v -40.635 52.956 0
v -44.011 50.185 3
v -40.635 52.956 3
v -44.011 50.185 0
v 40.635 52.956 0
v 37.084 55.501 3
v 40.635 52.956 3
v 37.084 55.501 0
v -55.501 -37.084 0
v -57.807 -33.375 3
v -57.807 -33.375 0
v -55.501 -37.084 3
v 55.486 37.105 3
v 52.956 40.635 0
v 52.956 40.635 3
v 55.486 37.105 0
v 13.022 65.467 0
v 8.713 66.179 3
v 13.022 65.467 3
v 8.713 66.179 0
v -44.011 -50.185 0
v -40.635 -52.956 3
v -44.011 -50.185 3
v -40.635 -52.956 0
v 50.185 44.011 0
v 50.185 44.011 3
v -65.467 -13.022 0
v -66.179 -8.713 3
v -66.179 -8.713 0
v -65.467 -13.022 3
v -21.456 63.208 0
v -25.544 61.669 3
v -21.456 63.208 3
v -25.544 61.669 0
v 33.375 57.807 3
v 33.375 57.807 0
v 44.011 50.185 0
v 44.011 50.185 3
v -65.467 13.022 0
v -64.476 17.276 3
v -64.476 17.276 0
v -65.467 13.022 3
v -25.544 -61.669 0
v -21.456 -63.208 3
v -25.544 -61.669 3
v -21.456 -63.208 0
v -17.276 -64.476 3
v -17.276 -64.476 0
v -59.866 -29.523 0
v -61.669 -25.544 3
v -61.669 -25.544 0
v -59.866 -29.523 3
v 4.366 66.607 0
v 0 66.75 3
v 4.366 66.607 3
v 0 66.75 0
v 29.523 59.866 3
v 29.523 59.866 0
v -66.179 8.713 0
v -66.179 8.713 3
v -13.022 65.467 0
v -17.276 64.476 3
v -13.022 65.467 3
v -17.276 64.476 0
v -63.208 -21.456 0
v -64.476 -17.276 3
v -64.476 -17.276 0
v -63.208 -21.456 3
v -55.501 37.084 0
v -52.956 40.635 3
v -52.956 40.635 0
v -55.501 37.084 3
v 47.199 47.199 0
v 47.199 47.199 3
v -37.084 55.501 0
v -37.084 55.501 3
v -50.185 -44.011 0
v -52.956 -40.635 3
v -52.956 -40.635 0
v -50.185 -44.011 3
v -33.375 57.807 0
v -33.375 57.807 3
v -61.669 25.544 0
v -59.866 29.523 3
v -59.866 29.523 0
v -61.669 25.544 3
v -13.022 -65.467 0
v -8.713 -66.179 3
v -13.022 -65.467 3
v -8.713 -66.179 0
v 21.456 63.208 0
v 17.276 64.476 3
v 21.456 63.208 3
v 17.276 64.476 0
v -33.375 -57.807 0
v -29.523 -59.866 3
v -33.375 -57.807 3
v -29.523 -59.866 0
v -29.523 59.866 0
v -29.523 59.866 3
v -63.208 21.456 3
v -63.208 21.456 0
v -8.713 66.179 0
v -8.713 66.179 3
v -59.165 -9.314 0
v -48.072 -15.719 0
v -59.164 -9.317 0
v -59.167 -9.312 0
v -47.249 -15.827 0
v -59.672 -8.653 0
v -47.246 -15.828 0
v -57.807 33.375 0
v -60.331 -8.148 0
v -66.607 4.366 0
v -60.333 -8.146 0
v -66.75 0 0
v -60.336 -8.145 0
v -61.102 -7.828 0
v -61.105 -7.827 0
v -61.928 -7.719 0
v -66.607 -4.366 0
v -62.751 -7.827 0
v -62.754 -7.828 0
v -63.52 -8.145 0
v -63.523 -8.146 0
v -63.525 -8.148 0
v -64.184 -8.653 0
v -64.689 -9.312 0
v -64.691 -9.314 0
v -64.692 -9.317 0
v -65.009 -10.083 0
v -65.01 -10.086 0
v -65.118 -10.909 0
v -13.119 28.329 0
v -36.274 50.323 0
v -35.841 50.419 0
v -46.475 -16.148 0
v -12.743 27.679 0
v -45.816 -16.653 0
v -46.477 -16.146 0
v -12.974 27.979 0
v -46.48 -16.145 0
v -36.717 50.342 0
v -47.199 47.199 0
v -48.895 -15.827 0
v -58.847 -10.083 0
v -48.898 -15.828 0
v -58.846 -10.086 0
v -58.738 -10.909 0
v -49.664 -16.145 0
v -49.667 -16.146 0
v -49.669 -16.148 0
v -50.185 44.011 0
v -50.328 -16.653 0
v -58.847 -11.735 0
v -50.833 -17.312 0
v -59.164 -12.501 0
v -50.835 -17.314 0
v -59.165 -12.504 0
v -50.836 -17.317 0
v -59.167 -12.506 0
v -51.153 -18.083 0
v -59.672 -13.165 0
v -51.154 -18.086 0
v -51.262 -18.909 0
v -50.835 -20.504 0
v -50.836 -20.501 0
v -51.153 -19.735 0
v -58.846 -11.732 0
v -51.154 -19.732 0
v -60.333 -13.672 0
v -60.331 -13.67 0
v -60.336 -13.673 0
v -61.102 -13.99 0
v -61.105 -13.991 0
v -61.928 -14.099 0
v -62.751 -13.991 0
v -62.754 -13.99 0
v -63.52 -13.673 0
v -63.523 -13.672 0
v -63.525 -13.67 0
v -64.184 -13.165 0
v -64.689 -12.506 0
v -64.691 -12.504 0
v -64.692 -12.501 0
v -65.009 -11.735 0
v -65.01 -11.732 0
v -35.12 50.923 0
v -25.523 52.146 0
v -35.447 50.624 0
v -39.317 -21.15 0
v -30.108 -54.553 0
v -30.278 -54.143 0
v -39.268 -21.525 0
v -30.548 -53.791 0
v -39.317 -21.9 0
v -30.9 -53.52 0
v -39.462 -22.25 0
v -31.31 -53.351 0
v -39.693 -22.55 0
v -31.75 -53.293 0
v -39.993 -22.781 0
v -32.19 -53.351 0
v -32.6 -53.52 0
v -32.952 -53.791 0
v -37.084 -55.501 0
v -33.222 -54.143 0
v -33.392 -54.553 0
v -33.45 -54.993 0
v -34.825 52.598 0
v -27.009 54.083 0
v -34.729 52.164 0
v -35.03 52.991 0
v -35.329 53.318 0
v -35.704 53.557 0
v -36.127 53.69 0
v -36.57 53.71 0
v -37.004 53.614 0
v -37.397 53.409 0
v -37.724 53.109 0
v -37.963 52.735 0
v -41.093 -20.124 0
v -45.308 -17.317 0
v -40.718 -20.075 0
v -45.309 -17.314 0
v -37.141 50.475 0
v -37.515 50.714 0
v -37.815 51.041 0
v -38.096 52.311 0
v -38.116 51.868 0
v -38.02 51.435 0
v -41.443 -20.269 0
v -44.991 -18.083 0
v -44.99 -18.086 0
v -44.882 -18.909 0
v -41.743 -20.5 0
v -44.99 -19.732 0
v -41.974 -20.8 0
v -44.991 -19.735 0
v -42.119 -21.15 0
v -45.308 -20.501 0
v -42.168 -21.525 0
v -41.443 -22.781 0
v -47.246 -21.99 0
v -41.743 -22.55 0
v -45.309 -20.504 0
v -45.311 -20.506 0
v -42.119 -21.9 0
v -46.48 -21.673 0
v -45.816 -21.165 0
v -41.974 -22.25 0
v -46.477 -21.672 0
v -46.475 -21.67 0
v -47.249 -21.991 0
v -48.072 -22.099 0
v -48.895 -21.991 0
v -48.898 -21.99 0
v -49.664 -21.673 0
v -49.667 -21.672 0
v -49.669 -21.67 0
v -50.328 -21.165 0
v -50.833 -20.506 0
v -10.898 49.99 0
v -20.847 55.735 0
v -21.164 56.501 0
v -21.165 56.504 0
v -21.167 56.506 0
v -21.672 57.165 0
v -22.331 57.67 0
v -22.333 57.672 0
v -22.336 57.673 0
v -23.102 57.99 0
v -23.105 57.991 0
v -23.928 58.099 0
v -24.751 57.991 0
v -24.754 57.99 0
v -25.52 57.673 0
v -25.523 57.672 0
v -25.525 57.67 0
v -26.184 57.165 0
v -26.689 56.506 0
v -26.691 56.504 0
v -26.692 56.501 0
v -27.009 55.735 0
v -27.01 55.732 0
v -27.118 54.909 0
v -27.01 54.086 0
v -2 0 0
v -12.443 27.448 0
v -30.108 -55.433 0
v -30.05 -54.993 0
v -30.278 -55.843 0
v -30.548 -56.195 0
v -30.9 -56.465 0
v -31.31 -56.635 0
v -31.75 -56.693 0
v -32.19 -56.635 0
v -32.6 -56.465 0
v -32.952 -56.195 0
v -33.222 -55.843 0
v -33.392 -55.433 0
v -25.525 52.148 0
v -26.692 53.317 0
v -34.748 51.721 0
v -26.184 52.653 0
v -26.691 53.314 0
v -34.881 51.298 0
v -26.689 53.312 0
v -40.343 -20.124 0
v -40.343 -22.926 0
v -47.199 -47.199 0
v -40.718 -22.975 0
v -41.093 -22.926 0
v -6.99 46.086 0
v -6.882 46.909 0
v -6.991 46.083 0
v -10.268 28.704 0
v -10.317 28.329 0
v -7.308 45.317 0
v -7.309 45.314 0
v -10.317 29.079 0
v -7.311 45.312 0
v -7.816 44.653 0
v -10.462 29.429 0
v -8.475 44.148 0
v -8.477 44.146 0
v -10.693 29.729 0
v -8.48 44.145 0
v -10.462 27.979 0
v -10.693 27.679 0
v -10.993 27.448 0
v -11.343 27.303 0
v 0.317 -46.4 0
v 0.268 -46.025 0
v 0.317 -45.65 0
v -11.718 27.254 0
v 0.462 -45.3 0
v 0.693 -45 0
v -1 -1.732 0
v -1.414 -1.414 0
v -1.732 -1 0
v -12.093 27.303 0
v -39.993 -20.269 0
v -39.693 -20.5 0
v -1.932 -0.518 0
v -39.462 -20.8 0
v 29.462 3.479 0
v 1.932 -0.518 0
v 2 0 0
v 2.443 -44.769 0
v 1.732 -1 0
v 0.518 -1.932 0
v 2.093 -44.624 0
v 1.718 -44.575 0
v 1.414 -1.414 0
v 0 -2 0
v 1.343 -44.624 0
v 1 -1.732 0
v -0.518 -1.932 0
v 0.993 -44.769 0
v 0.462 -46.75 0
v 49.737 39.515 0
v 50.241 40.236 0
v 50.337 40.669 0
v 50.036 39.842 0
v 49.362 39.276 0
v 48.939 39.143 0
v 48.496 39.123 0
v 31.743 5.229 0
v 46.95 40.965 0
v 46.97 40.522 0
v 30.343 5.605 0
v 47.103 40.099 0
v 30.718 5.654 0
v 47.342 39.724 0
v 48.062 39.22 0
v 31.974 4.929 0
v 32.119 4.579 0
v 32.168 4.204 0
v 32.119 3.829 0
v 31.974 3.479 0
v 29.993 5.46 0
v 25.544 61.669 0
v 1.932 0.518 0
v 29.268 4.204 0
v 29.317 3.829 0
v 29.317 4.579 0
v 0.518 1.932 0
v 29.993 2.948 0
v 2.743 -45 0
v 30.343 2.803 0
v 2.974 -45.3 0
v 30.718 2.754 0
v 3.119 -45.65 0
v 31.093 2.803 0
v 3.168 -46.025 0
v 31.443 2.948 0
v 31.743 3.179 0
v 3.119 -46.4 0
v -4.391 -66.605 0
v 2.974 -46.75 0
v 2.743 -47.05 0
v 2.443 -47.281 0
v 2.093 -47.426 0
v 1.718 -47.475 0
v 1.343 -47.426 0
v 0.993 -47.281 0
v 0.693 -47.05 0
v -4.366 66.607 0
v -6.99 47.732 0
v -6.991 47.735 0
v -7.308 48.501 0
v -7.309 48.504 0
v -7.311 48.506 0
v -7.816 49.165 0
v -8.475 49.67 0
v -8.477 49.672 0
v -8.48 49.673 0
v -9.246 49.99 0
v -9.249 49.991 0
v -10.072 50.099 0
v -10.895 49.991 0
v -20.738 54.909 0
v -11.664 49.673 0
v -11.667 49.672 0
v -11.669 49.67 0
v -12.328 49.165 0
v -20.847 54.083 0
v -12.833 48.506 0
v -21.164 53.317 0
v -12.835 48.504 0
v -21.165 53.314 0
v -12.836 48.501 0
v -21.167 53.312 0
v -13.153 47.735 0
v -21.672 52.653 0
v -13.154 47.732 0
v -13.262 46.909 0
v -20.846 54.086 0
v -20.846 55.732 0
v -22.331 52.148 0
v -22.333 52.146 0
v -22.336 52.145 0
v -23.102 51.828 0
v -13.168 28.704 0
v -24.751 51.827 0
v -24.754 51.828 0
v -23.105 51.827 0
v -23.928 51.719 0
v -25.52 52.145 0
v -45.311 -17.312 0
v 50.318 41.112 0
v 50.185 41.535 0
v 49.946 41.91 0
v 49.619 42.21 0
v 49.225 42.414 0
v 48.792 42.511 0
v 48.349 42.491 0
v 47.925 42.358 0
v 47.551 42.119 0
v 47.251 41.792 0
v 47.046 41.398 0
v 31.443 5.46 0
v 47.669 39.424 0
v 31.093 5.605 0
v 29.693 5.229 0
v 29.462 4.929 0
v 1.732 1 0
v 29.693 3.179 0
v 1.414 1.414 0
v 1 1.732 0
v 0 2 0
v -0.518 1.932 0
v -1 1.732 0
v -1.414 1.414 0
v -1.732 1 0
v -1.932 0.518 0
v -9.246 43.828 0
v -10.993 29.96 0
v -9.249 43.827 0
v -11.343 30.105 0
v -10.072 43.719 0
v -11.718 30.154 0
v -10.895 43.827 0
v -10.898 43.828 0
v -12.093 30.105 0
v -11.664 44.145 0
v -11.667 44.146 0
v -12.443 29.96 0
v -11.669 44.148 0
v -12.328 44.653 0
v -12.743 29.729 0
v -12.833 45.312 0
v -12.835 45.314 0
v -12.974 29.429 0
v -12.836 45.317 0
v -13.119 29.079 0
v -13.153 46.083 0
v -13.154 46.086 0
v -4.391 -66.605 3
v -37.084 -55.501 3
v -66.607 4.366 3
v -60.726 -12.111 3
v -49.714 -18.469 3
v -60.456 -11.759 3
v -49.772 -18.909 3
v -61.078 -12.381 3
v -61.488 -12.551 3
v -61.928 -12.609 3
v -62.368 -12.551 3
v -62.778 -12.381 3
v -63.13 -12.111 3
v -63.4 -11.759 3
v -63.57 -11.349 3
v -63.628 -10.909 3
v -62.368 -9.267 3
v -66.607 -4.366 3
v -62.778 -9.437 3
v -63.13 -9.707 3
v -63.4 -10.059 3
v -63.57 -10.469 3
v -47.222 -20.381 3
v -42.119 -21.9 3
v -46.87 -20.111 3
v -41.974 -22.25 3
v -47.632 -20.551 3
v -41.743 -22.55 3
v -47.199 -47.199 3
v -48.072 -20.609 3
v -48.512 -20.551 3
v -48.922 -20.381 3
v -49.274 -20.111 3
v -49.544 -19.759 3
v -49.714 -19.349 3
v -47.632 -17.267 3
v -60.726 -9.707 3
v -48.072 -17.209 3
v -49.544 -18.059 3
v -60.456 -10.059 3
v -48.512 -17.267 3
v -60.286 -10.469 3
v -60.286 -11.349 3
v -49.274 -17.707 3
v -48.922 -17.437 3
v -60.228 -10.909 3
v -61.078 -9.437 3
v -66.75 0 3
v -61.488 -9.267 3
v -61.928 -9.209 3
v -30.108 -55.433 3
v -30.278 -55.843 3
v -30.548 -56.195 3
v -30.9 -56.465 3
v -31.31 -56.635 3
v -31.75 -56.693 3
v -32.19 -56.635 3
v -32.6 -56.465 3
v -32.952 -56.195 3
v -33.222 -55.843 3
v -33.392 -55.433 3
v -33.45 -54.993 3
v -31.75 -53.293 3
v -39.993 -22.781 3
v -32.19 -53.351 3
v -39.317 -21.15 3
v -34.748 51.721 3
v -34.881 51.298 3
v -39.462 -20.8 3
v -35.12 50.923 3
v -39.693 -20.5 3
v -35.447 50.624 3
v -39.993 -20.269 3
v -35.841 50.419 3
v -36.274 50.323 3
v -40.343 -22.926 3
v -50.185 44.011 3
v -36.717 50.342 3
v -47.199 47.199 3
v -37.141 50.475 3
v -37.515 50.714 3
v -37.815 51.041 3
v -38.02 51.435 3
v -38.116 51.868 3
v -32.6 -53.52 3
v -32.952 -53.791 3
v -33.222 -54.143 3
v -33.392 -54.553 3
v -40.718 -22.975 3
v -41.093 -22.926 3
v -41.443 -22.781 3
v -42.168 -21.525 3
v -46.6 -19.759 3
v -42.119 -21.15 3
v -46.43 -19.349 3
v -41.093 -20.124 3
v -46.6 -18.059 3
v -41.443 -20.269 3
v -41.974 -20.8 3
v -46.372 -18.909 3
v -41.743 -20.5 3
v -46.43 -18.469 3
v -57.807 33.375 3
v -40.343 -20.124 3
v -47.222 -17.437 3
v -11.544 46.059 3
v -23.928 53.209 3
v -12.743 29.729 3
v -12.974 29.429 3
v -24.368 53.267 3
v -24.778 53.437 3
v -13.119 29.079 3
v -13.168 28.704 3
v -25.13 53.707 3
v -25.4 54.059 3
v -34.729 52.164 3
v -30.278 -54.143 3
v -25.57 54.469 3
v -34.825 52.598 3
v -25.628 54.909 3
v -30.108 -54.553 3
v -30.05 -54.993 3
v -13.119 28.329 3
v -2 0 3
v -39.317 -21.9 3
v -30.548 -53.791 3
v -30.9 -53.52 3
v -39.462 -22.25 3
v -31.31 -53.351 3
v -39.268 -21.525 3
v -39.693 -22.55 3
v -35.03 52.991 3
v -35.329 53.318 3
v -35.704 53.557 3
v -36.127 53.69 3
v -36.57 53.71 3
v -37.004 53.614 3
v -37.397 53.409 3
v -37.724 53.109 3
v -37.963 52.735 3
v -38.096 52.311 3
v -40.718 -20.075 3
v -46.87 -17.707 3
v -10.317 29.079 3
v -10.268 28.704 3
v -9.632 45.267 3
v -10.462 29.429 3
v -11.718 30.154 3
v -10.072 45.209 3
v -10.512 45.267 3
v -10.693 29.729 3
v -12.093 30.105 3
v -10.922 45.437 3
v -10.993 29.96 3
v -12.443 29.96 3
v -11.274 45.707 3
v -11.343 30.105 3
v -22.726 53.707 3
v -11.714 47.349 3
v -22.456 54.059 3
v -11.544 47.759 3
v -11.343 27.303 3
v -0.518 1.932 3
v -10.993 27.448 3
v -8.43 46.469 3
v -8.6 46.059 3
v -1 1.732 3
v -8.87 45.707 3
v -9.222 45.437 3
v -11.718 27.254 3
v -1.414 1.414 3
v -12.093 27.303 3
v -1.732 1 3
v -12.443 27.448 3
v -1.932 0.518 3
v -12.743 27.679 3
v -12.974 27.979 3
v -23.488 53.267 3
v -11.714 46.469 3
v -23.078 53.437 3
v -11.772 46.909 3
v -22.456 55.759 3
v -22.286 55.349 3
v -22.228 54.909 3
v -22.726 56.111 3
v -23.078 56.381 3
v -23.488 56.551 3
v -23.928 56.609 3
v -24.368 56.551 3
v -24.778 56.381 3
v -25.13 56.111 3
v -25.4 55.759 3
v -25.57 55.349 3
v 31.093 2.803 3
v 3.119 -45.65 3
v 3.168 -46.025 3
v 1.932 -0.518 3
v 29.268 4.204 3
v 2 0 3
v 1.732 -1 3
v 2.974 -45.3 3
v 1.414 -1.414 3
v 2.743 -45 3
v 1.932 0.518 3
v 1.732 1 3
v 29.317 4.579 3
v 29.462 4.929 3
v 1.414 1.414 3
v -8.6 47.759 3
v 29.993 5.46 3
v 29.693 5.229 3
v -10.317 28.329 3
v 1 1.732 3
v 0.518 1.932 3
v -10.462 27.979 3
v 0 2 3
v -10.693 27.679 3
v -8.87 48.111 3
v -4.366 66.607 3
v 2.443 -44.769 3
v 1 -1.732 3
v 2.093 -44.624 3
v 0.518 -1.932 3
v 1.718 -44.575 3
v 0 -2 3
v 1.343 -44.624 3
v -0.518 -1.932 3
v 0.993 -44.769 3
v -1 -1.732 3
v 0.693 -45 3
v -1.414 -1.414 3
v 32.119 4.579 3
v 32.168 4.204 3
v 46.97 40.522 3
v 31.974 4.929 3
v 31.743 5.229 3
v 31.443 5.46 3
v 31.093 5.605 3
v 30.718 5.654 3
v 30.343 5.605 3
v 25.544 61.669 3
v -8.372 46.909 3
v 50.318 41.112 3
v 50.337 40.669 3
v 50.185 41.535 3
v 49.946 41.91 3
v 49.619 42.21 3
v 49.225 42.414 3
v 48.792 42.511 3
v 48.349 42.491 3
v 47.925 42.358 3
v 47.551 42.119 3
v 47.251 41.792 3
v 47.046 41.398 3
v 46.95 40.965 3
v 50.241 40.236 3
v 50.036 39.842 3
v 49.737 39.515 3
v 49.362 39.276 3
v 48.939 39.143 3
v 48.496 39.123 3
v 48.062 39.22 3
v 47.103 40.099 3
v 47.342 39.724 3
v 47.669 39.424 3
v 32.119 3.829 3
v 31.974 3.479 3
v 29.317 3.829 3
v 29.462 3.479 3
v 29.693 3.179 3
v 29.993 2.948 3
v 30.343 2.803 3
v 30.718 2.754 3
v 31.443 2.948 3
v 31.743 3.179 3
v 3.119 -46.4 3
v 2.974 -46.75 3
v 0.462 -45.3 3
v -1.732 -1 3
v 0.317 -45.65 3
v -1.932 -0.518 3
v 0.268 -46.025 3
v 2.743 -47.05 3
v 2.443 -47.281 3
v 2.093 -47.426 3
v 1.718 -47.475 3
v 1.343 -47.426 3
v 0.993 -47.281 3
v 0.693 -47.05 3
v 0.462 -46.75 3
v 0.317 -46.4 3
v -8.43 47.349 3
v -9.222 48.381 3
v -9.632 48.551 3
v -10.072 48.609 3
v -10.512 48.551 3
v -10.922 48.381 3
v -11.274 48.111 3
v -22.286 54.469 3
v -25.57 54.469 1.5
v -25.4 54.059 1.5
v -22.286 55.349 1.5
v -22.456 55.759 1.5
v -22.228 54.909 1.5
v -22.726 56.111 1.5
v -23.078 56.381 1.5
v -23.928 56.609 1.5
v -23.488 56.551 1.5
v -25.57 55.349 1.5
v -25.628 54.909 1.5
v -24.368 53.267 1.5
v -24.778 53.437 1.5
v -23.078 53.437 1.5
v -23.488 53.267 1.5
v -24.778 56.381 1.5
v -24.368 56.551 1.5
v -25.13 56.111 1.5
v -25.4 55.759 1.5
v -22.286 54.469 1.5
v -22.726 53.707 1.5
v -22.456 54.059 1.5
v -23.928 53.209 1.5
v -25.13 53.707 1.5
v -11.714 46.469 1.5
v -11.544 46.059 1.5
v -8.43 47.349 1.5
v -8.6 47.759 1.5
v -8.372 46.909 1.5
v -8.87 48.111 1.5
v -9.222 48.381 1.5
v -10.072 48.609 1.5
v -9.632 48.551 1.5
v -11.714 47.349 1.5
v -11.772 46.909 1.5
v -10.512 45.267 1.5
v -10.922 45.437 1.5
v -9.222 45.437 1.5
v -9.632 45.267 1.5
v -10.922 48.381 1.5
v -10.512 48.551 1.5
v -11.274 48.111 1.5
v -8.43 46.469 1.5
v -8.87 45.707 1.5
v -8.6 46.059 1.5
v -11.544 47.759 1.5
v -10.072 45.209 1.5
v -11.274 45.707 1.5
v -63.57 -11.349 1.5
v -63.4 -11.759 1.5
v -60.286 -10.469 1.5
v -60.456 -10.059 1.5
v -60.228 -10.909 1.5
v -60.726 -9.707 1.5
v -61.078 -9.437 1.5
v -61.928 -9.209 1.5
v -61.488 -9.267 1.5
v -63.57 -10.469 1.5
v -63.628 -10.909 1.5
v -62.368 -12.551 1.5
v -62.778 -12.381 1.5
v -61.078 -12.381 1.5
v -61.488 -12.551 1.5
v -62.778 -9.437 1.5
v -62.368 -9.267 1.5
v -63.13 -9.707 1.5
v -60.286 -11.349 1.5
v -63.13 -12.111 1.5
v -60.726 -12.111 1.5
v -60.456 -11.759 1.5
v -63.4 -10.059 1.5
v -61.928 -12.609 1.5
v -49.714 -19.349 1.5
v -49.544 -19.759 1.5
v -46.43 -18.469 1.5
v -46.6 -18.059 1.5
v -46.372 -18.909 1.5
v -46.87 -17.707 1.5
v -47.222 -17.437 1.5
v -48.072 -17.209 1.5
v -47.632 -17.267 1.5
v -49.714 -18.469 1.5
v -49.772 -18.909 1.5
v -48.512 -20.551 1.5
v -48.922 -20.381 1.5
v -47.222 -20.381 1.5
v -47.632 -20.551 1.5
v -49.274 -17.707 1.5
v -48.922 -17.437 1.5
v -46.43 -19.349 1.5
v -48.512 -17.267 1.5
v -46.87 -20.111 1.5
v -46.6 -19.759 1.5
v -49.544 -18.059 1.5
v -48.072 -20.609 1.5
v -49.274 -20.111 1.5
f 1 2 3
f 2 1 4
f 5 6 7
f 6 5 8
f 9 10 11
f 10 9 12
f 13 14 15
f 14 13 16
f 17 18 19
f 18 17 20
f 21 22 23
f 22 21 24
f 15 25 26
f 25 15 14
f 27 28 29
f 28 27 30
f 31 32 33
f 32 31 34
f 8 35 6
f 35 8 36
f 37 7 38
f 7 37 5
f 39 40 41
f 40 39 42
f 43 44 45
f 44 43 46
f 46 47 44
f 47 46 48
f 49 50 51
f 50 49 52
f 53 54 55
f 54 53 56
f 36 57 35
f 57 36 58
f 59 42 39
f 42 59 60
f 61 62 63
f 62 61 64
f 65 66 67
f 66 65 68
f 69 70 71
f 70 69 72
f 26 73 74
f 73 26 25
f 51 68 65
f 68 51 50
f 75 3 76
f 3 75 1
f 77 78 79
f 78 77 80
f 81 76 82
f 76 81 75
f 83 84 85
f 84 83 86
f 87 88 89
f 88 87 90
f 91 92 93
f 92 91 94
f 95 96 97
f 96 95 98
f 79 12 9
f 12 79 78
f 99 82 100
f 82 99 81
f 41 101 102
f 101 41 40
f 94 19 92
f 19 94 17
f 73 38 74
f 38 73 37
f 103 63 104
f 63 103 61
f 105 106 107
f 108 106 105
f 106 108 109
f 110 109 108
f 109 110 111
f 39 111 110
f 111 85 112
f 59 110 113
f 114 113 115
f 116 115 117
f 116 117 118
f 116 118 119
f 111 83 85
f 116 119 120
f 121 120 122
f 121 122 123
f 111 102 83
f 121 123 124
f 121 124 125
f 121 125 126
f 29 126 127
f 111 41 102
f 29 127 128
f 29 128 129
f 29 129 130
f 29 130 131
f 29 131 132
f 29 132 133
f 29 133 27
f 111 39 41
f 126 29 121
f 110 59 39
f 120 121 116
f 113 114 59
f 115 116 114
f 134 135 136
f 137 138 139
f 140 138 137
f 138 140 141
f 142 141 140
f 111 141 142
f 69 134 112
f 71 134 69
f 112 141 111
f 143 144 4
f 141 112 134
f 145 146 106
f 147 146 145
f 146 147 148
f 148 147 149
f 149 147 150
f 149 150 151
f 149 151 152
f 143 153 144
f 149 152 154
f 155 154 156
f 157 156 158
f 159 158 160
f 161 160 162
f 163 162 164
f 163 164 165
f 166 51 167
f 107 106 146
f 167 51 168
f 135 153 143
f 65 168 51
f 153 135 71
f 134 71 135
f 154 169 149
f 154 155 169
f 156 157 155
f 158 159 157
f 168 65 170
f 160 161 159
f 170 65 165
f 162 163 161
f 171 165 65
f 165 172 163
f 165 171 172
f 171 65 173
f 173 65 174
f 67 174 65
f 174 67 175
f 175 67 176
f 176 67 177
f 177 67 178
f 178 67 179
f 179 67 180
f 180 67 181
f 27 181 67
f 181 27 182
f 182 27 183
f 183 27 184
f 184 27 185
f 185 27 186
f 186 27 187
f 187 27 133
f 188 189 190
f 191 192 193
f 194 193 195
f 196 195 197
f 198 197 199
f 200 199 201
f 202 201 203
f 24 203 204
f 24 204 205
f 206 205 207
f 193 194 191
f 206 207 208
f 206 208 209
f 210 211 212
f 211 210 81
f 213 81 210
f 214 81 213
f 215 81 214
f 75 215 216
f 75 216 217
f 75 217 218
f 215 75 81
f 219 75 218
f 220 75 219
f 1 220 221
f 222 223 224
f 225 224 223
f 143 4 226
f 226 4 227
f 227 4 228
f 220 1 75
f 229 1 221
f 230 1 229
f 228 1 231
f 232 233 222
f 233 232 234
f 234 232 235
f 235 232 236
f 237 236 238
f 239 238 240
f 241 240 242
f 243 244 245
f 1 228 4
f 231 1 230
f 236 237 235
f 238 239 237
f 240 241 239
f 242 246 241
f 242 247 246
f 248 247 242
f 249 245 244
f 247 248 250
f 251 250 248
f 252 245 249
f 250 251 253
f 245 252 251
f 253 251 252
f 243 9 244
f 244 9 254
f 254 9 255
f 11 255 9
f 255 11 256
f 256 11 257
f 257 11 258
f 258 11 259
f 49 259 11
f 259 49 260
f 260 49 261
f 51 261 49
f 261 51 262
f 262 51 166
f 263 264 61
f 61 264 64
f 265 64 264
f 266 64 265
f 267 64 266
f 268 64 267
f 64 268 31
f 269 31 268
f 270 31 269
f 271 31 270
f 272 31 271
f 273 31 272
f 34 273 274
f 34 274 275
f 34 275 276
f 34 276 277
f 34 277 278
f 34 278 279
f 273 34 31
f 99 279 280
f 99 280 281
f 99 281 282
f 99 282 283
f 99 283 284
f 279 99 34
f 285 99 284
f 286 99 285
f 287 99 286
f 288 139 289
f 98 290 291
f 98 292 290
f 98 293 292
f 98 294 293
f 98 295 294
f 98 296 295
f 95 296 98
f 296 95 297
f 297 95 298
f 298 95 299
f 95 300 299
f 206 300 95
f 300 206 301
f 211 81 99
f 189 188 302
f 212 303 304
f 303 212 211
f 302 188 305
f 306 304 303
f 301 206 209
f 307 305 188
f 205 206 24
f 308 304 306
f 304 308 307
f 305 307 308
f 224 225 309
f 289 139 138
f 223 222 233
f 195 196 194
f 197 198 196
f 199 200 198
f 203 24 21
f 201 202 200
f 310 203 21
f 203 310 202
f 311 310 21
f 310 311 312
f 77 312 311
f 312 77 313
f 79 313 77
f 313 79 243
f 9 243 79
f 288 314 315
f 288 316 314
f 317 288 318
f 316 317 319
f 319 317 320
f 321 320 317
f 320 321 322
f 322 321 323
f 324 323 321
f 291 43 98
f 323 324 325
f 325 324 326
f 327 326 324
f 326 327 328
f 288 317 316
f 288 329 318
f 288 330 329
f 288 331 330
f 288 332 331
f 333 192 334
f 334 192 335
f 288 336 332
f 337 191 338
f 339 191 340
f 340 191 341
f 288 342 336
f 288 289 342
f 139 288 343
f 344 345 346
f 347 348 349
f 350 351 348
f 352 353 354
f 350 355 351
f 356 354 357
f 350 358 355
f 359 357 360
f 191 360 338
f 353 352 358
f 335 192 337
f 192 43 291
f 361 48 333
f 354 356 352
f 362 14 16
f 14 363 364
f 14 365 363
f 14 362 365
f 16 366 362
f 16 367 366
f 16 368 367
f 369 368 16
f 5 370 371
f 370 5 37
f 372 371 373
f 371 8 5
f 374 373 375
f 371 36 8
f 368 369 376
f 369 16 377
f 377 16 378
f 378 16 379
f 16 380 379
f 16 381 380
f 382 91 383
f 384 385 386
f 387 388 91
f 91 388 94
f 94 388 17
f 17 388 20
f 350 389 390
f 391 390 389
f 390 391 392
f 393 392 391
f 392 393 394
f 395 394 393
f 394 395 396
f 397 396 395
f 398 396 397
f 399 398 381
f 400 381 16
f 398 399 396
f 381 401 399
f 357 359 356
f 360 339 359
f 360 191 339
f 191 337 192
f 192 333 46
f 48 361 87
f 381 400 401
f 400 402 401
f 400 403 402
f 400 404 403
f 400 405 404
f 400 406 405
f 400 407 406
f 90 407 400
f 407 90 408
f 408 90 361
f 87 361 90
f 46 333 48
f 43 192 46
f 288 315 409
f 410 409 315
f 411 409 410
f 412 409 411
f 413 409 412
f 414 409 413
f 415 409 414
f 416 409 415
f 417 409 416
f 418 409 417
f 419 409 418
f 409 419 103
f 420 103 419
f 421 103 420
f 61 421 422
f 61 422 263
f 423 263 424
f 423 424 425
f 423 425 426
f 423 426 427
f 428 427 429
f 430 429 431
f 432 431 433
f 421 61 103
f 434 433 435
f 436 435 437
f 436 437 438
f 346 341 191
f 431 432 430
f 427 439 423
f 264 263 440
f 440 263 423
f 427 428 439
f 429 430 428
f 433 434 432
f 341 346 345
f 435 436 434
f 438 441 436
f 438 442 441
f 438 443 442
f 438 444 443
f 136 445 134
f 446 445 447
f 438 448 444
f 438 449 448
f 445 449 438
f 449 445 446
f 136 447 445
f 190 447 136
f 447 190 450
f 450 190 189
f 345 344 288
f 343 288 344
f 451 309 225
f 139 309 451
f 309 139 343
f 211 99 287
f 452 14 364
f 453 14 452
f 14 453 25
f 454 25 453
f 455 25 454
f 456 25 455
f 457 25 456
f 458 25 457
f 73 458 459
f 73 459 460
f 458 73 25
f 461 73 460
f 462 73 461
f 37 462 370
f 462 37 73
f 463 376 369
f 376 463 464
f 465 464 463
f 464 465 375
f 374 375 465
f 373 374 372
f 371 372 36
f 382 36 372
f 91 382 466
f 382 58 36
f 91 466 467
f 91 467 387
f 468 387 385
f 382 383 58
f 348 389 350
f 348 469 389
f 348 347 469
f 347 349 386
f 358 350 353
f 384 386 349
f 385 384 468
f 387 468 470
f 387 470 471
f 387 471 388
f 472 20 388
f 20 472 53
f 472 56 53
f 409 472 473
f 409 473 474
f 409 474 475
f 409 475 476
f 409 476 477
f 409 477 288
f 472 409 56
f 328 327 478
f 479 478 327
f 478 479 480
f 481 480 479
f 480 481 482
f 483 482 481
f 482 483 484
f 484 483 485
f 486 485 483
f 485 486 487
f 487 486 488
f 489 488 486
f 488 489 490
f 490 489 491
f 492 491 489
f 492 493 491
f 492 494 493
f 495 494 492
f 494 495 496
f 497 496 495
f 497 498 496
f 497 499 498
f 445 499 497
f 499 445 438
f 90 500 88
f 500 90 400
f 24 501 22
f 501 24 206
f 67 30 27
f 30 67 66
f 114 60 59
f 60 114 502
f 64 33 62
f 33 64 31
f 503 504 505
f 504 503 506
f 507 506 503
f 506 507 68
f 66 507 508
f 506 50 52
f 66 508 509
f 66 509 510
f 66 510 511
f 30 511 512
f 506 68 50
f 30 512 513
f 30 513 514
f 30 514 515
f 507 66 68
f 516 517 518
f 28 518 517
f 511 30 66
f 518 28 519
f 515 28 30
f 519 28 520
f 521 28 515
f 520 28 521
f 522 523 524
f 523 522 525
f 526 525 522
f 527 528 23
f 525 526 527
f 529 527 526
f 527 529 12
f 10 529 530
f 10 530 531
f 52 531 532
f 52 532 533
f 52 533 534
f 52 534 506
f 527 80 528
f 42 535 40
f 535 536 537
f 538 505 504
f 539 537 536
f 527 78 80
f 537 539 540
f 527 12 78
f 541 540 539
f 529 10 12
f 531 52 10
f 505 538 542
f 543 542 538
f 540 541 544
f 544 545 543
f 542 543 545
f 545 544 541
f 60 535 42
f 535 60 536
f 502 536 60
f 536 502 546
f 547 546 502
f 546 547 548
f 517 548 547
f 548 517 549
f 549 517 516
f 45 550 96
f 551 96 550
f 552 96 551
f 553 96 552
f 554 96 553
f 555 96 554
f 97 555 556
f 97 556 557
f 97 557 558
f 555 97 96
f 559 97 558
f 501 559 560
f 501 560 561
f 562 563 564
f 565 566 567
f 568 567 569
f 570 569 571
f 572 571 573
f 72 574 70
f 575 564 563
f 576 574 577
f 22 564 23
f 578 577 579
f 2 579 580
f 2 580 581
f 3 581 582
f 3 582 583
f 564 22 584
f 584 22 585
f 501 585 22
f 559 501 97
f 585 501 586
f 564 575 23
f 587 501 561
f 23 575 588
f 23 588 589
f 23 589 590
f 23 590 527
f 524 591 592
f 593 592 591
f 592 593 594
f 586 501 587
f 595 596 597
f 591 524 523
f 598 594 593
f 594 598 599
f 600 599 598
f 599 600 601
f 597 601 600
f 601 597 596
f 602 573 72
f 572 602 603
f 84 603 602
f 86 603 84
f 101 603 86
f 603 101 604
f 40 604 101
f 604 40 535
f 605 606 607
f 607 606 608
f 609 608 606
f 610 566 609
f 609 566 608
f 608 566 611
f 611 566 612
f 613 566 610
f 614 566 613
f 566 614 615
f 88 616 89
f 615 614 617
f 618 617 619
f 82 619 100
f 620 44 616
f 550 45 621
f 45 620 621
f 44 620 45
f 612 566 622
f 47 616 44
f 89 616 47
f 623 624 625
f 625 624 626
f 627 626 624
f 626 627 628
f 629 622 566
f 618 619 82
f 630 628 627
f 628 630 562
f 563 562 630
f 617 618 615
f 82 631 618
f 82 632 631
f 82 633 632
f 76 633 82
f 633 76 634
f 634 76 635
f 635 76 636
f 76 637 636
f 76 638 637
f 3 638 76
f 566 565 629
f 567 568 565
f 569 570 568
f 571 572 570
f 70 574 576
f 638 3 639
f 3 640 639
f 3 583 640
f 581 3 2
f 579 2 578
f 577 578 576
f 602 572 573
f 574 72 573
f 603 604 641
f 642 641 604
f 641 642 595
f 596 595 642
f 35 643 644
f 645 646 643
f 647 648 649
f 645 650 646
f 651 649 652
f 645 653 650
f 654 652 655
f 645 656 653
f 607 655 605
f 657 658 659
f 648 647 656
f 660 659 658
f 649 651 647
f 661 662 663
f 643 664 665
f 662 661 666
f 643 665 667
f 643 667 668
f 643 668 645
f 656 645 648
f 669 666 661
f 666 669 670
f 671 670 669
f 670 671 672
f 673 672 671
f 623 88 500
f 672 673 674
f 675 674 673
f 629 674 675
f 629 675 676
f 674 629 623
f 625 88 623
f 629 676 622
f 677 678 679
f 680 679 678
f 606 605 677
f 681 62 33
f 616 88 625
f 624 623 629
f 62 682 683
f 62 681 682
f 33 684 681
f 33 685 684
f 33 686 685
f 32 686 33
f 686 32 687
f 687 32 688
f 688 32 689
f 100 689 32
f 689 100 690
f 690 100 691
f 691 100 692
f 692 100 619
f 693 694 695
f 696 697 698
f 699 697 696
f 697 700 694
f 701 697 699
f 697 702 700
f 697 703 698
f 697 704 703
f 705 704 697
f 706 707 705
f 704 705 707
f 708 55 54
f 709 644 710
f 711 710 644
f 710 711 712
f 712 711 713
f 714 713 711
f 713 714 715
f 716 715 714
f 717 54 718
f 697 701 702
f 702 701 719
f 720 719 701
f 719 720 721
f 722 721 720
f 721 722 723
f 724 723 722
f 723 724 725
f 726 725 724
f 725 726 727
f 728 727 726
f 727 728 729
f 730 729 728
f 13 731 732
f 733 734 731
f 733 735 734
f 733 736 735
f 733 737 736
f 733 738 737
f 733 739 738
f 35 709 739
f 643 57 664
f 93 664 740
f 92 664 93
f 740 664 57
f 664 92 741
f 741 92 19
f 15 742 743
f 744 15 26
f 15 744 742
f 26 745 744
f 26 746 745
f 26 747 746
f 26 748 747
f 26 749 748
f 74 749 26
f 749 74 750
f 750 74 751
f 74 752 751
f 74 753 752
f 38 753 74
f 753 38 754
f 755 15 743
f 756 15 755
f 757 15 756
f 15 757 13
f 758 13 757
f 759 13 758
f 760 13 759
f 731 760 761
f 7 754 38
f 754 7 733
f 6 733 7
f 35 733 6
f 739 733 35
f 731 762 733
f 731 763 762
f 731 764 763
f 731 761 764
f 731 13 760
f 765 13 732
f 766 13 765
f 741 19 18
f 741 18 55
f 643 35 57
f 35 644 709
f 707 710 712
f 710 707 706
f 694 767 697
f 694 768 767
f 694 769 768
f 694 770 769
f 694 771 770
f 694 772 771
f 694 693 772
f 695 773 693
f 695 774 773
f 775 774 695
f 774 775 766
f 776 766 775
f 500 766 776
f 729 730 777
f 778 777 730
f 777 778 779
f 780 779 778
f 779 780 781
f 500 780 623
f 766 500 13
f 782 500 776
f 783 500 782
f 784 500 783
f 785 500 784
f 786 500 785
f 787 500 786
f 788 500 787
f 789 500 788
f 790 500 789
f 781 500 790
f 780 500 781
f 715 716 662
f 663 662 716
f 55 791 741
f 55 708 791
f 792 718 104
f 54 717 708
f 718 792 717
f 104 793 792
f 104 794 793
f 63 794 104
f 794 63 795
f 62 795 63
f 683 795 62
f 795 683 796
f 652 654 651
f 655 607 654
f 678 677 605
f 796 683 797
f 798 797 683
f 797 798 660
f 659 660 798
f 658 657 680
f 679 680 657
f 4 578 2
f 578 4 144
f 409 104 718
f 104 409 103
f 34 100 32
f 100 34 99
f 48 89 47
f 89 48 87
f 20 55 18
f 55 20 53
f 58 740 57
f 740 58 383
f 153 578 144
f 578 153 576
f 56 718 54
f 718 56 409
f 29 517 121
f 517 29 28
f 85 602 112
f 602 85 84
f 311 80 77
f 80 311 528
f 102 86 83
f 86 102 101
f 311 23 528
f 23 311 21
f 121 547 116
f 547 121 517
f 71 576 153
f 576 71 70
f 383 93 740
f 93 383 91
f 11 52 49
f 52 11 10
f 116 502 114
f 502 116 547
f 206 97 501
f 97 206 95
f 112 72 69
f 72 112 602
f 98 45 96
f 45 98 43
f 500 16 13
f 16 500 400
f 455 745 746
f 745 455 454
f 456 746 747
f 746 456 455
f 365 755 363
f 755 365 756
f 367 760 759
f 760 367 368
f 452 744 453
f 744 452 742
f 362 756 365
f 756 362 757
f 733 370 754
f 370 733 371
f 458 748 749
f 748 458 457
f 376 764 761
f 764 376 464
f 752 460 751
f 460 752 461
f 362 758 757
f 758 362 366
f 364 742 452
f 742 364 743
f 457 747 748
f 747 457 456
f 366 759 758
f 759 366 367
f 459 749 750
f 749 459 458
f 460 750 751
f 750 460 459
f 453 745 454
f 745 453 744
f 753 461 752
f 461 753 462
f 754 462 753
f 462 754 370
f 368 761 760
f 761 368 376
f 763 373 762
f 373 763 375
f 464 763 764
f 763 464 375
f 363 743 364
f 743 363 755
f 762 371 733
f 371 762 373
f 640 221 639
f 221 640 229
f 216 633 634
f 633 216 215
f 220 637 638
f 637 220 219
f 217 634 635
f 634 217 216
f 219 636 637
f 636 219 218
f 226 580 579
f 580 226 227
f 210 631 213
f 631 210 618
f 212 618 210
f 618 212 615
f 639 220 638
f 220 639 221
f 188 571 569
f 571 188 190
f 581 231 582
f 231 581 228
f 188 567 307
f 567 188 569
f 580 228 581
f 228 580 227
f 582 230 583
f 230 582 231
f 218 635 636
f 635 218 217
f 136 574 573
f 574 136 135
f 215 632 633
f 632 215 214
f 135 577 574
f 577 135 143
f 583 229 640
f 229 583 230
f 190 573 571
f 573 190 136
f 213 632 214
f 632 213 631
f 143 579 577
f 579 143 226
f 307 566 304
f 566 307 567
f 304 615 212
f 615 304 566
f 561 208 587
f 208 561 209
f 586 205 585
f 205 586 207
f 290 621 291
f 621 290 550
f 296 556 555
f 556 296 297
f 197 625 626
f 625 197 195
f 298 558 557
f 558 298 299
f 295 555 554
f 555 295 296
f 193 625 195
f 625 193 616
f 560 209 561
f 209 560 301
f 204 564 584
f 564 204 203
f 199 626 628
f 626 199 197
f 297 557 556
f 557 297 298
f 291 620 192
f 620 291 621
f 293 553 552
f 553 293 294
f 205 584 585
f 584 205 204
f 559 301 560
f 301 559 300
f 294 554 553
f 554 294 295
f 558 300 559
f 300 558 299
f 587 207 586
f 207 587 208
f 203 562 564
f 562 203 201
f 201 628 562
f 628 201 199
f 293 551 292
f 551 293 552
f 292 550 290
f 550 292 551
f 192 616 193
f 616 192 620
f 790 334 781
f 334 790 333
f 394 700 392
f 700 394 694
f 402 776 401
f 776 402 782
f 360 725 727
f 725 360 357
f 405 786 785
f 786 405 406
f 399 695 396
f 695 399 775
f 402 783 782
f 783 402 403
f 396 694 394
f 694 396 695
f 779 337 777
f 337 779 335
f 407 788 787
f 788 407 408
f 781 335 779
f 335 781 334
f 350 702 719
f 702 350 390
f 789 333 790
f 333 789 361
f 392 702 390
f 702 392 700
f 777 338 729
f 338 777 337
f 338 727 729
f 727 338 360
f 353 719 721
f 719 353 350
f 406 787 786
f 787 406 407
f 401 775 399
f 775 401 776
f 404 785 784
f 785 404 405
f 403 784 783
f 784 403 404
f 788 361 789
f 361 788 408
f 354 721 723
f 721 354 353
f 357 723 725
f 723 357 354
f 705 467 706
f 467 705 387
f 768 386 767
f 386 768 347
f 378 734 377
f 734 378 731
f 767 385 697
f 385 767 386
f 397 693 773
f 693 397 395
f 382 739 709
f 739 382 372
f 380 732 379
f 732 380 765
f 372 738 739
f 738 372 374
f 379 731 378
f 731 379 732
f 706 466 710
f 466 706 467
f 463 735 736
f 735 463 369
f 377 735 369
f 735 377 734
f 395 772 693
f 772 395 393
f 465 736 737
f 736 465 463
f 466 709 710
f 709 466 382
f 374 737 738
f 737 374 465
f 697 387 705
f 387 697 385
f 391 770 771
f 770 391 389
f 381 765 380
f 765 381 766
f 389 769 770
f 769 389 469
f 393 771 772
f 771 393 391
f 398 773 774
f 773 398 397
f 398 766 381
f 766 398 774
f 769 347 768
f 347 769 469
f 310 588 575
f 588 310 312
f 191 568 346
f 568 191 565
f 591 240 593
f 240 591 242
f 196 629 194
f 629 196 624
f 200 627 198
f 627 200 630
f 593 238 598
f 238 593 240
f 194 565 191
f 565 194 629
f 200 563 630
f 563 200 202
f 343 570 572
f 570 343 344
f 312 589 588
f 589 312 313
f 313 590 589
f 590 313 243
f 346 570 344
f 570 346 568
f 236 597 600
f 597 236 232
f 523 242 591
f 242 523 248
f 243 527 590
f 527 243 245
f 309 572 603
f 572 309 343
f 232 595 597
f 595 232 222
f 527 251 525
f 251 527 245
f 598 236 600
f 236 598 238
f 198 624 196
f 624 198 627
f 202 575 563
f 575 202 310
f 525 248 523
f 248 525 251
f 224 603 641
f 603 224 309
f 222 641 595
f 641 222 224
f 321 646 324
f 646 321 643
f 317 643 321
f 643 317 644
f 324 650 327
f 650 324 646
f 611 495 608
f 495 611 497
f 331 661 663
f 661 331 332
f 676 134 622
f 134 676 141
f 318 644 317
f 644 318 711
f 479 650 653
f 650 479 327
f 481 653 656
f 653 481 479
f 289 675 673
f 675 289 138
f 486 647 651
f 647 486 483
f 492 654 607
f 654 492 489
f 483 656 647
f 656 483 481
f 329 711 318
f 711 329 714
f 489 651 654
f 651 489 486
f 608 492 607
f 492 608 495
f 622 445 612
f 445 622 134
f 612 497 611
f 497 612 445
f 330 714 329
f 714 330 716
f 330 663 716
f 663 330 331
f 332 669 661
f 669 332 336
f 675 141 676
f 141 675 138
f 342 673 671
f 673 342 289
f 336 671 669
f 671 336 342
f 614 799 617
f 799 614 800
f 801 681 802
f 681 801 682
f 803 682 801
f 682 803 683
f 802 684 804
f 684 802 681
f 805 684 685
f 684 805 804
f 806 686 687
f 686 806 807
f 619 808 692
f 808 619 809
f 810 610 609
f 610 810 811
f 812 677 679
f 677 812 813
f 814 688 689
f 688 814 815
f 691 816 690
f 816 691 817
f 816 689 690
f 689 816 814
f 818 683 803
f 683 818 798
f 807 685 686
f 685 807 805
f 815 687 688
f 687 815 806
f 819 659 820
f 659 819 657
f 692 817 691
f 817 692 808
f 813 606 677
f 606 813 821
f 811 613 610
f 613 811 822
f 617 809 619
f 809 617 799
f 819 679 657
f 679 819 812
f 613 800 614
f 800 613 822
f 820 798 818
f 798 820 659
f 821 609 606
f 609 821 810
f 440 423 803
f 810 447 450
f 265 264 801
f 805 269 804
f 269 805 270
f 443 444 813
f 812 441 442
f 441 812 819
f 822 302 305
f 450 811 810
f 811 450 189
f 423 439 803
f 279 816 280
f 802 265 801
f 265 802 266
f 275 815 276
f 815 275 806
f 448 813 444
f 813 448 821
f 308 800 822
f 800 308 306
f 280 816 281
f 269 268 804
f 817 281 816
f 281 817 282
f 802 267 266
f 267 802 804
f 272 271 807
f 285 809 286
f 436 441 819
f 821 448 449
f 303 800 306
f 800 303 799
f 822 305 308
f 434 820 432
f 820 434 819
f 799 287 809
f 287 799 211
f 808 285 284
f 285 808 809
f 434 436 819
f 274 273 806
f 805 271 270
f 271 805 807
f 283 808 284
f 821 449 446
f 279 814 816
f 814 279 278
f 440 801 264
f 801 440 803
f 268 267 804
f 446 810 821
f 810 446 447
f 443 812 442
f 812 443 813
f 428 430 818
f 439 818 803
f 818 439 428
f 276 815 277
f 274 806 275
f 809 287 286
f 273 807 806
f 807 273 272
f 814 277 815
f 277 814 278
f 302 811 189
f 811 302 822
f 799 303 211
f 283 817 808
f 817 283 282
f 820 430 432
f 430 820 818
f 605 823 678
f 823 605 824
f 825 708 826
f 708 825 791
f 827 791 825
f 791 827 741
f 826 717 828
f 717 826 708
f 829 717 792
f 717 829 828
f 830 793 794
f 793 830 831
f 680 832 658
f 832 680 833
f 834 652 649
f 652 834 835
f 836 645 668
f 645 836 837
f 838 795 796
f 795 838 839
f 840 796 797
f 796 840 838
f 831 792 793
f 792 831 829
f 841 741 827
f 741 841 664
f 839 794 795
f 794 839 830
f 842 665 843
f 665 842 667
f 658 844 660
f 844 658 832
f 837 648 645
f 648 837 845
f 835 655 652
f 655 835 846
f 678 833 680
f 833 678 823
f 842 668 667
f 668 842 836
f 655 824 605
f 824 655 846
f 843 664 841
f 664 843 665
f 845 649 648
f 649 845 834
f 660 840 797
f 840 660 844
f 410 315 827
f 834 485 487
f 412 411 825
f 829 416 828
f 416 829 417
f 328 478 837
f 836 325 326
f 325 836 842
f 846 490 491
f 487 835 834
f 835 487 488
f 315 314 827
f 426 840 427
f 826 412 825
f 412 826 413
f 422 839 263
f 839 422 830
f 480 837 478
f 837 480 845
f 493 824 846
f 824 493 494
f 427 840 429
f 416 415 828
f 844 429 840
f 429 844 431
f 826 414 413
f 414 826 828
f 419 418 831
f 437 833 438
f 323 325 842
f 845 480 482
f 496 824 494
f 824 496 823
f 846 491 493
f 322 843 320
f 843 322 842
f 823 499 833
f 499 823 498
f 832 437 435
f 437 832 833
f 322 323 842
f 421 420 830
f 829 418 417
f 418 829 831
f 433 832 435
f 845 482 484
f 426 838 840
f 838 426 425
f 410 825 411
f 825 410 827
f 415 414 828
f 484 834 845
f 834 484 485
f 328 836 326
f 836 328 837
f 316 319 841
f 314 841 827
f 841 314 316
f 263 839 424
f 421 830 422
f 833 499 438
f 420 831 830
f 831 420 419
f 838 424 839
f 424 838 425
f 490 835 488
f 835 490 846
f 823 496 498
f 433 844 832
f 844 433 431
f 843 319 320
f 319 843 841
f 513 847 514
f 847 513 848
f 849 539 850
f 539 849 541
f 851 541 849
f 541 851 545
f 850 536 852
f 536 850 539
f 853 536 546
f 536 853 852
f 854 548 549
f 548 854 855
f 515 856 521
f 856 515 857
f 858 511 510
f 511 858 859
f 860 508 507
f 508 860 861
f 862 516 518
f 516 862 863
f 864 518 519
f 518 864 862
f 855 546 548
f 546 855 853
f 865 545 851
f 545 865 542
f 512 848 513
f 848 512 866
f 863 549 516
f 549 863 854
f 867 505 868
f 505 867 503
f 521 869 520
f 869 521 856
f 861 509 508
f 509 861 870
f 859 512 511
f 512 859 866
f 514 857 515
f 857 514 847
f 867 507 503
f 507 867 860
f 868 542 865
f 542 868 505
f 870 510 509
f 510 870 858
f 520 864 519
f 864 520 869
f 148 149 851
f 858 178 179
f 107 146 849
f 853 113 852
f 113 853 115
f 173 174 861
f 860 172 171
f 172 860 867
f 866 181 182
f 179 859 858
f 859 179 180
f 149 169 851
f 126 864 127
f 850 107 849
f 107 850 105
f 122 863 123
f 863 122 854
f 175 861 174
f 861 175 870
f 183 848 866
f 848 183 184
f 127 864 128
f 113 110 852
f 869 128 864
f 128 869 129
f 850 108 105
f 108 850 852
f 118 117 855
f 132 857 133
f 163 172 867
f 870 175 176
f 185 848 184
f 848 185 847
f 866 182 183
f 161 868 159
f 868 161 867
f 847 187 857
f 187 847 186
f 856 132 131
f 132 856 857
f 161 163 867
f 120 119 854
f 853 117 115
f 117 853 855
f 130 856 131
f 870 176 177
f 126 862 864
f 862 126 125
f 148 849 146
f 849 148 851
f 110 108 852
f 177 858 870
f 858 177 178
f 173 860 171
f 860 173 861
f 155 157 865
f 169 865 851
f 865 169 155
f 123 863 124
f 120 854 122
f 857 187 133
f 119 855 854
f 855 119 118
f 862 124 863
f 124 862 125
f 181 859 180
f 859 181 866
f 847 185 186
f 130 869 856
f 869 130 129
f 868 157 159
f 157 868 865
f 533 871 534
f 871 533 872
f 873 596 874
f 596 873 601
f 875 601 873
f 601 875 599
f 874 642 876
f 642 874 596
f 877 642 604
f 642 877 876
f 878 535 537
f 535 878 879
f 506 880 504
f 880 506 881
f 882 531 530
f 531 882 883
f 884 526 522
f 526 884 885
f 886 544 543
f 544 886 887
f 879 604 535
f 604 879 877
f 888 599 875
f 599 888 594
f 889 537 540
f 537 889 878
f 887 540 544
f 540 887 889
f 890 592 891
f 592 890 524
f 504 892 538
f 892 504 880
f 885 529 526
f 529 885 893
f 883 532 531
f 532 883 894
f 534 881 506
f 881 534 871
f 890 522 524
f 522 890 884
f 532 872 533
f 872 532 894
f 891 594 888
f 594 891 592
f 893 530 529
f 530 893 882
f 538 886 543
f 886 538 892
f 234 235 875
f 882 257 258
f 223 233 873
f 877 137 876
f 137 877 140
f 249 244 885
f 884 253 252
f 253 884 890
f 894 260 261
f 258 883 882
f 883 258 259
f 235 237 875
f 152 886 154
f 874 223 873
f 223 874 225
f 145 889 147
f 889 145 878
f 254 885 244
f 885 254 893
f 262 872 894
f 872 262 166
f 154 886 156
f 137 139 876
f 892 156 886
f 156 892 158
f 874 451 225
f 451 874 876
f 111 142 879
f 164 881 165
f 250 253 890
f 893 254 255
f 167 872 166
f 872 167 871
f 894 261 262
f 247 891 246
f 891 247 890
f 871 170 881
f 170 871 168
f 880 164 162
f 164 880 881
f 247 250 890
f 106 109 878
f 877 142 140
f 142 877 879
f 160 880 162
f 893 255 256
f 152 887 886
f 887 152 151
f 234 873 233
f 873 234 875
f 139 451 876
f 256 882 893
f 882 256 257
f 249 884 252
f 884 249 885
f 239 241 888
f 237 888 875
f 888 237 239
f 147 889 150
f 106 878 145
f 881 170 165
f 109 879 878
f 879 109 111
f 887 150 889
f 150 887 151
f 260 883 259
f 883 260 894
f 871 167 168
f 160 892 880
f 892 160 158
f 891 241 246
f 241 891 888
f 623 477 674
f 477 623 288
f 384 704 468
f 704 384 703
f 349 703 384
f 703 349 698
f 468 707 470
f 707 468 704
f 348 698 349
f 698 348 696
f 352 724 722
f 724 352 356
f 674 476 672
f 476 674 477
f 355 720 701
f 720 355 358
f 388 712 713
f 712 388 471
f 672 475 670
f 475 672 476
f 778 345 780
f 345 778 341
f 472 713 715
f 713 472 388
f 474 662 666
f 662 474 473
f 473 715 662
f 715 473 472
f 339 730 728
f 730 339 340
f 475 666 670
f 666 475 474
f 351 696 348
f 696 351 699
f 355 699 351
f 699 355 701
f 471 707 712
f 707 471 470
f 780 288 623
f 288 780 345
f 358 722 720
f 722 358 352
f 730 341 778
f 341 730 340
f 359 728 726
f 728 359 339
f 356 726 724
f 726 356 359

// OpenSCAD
// file: layout.scad
// GENERATED by cad/fit.py from cad/ordered_parts.toml and config.scad.
// Do not edit: change those and run  python3 cad/fit.py  (from sport_cam/).

base_d = 141;
base_h = 90;
window_z = 44.6;
shelf_z = 56.6;
shelf_r = 66.75;
gap_ang = 330;
gap_d = 29.5;
post_r = 63.5;
post_angs = [40, 125, 240];
window_ribs = [40, 60, 80, 100, 120, 140, 160, 180, 200, 220, 240, 260, 280, 300, 320, 340, 0, 20];
pi_holes = [[1.718, -46.025], [30.718, 4.204], [-40.718, -21.525], [-11.718, 28.704]];
pi_hole_d = 2.9;
usbc_ang = 195;
usbc_z = 12.25;
usbc_w = 13.5;
usbc_h = 8;
switch_ang = 150;
switch_z = 20;
switch_hole_d = 24.5;
switch_flange_d = 32;
switch_boss_d = 36;
switch_seat_r = 68.542;
switch_panel_t = 3;
switch_flat_d = 22.5;
switch_flat_rot = 0;
vents_low = [5, 25, 65, 85, 105, 225, 265, 285, 305, 325, 345];
vent_low_z = 9;
vents_high = [5, 25, 65, 85, 105, 165, 185, 205, 245, 265, 285, 345];
vent_high_z = 71.8;
lid_screw_angs = [45, 135, 225, 315];
lid_screw_z = 87;
lid_screw_recess = 0;
ptz_head_d = 5.3;
ptz_slot_min = 70;
ptz_slot_max = 114.19;
ptz_bolt_angs = [45, 135, 225, 315];
cable_slot_ang = 180;
cable_slot_r = 58.25;
cable_slot_w = 28;
cable_slot_d = 9;
risers = [[33.843, 14.639, 30, 11, 8], [56.018, -23.769, 30, 11, 8], [-30.018, -22.231, 30, 11, 8], [-7.843, -60.639, 30, 11, 8], [27.079, 50.758, 30, 11, 8], [40.079, 28.242, 30, 11, 8], [-30.079, 17.758, 30, 11, 8], [-17.079, -4.758, 30, 11, 8]];
floor_holes = [[33.843, 14.639, 3.4, 6.4, 14], [56.018, -23.769, 3.4, 6.4, 14], [-30.018, -22.231, 3.4, 6.4, 14], [-7.843, -60.639, 3.4, 6.4, 14], [27.079, 50.758, 3.4, 6.4, 14], [40.079, 28.242, 3.4, 6.4, 14], [-30.079, 17.758, 3.4, 6.4, 14], [-17.079, -4.758, 3.4, 6.4, 14], [-59.627, -20.636, 3.4, 6.4, 3], [-61.956, -11.942, 3.4, 6.4, 3]];
shelf_holes = [[-23.928, 54.909, 3.4, 6.4], [-10.072, 46.909, 3.4, 6.4], [-61.928, -10.909, 3.4, 6.4], [-48.072, -18.909, 3.4, 6.4]];
rests = [[-36.643, -9.819, 195, 6, 10, 6]];
nut_af = 14.29;
nut_t = 8.33;
bank_l = 114.8;
bank_w = 75.5;
bank_h = 36.2;
// file: config.scad
// SportCam — parametric dimensions (mm). Every part file includes this.
//
// Three kinds of number feed the CAD:
//   * design choices — wall thickness, clearances — set below;
//   * the sizes of the parts you buy — in ../../cad/ordered_parts.toml;
//   * the layout — where each board sits, which way the Pi faces, how big
//     the enclosure is — which ../../cad/fit.py solves from the other two
//     and writes to layout.scad (included half-way down).
// After changing either file run   python3 cad/fit.py   from sport_cam/.
// It re-solves the layout, re-renders the STLs and audits that every part
// fits together and prints on a Bambu Lab A1 Mini (cad/FIT_REPORT.md).
//
// Keep the numbers above the include plain numbers (fit.py reads them);
// anything worked out from the layout goes below it.
//
// This is the **PTZ-base build**: the camera, pan and tilt all come from the
// Arducam IMX477 PTZ camera with metal pan-tilt base (B0167B12), which bolts
// to the lid of a static enclosure — see docs/design/03-mechanical-design.md.
//
// This is the **camera-only variant**: no UWB anchors, no mast, no wearable.
// The camera finds and follows a person by vision alone.

$fn = 96;
clr = 0.25;                    // general printed-fit clearance per side

// ---- enclosure -------------------------------------------------------------
// Bottom to top: the power drum under the floor (below); the LED ring under a
// printed shelf, shining out through the LED window; the Raspberry Pi on the
// shelf; the lid with the camera. Every part must print in one piece on a
// Bambu Lab A1 Mini (≤ 170 mm on every axis); fit.py keeps it that way.
base_d_min    = 150;           // narrowest enclosure (outer Ø); fit.py widens it only if the parts need it
base_h_min    = 40;            // lowest floor-to-lid height; fit.py raises it to clear the stack
base_wall     = 3;
lid_t         = 5;             // lid is structural: it carries the whole camera
spigot_h      = 6;             // locating ring under the lid that drops into the mouth
spigot_w      = 3;
lid_screw_pad = 7;             // the ring is thickened here for the four radial M3 inserts
lid_screw_d   = 3.4;
led_window_h  = 12;            // circumferential window the LED ring lights
window_bridge = 22;            // longest unsupported span over the window; ribs every this far
window_rib_w  = 3;
diffuser_t    = 1.6;           // translucent band slid over the outside of the window
diffuser_lip  = 2;             // how far it overlaps the wall above and below
ledge_h       = 2;             // the band rests on this outside ledge

tape_t        = 1;             // foam tape under the power boards and the LED ring
part_gap      = 2;             // clearance fit.py keeps between parts
wall_gap      = 1;             // and between a part and the wall
shelf_t       = 3;             // the Pi shelf
post_d        = 10;            // shelf posts, merged into the wall; M3 insert in each top
post_insert_d = 4.0;
vent_w        = 4;
vent_h        = 8;
ribbon_slack_h = 8;            // clear height kept under the lid's cable slot for the ribbon to turn

// ---- Arducam pan-tilt base interface ---------------------------------------
// The base is a round turntable on four brass standoffs, the pan servo hanging
// under it between them. It keeps its standoffs: four M3 screws come up
// through the lid into them. Arducam publishes no drawing for the B0167B12
// base, so the lid is cut with radial SLOTS spanning this range. Your base's
// spacing goes in ordered_parts.toml [ptz]; the audit checks it lands inside.
ptz_bolt_min  = 70;
ptz_bolt_max  = 104;
ptz_slot_w    = 3.4;           // M3 clearance
// The ribbon and the leads leave the camera head at the top, drape over the
// turntable and come in through a slot at the back of the lid (fit.py sizes
// it to the ribbon and places it clear of the bolt slots and the lid screws).
ptz_loop      = 60;            // free ribbon kept outside for the pan and tilt travel

// ---- power drum ------------------------------------------------------------
// A round, open-topped box the enclosure's own diameter, screwed under its
// floor (the floor is its lid), so the two make one cylinder. The tripod screws
// into it, and it holds everything to do with power, which leaves the
// enclosure only the LED ring, the shelf and the Pi, and makes the whole thing
// lower. Across the middle, a pocket the power bank slides into from one side;
// the buck and the power latch stand on edge against the pocket's two side
// walls, screwed through them from inside the pocket; the PD trigger and the
// rocker switch are on the drum wall. A drop-in plate under the bank holds the
// tripod nut and carries the sprung catch. fit.py places it all.
drum_wall = 2.4;               // outer wall
drum_floor = 3;                // also the ledge the tripod screw pulls the nut down onto
pocket_wall = 3;               // the bank pocket's walls; the boards' screws are countersunk flush on the bank's side
pocket_clr = 0.6;              // round the bank, each side, so it slides
pocket_head = 1.0;             // air over the bank, under the enclosure floor
board_clear = 1.5;             // under a board standing on edge
drum_post_d = 10;              // four posts merged into the wall, an M3 heat-set insert in each top
drum_insert_d = 4.0;
drum_insert_h = 6;
wire_hole_d = 12;              // in the enclosure floor, for the leads up from the drum
catch_l = 6;                   // the catch's ramp, beyond the bank's front face
catch_h = 2.5;                 // how far it stands up in front of the bank
catch_w = 30;                  // its width, across the open end
bar_span = 50;                 // it sits on a crossbar along the plate's front edge, held at both ends,
bar_t = 2.4;                   // thinned from underneath so it flexes down as the bank goes over
finger_l = 24;                 // finger windows beside the bank's front: how far in from the open end,
finger_z = 10;                 // their bottom above the bank's underside,
finger_d = 14;                 // and how far past the pocket walls they reach
tripod_clear_d = 10.2;         // through the drum floor, for the bushing or a 3/8-16 screw
tripod_nut_clr = 0.2;          // round the nut in its hex hole, each side (epoxied)
plate_clr = 0.3;               // round the drop-in plate in the pocket, each side

// ---- solved layout ---------------------------------------------------------
include <layout.scad>          // GENERATED by cad/fit.py — bought-part sizes + layout

R_in = base_d / 2 - base_wall; // inside of the wall
// main file
// Pi shelf. Rests on the three posts in the enclosure wall, screwed into the
// heat-set inserts in their tops (M3 × 8). The Raspberry Pi sits on top on
// M2.5 nylon standoffs; the LED ring hangs underneath on foam tape, LEDs
// down, so it lights the window between the power boards and the shelf.
//
// One side is cut away along a chord: the Pi's USB-C pigtail, the latch's
// HOLD and SENSE leads, the PTZ controller's 5 V and the LED ring's leads pass between
// the floor and the shelf through that gap.
//
// The shelf's size, the gap, the posts and the Pi's holes all come from
// layout.scad (cad/fit.py). Print flat, 3 walls, 20 %; white or natural
// PETG helps the ring's light reach the window.
include <config.scad>

module shelf() {
    difference() {
        intersection() {
            cylinder(r = shelf_r, h = shelf_t);
            // keep the side of the chord away from the cable gap
            rotate([0, 0, gap_ang]) translate([gap_d - 400, -200, -1]) cube([400, 400, shelf_t + 2]);
        }
        for (a = post_angs) rotate([0, 0, a]) translate([post_r, 0, -1])
            cylinder(d = 3.4, h = shelf_t + 2, $fn = 24);
        for (p = pi_holes) translate([p[0], p[1], -1])
            cylinder(d = pi_hole_d, h = shelf_t + 2, $fn = 24);
        // the level shifter's standoffs, when it is on the shelf: countersunk screws up from underneath
        for (h = shelf_holes) translate([h[0], h[1], 0]) {
            translate([0, 0, -1]) cylinder(d = h[2], h = shelf_t + 2, $fn = 24);
            translate([0, 0, -0.01]) cylinder(d1 = h[3], d2 = h[2], h = (h[3] - h[2]) / 2 + 0.01, $fn = 24);
        }
        // centre mark for sticking the LED ring on concentric
        translate([0, 0, -1]) cylinder(d = 4, h = shelf_t + 2, $fn = 24);
    }
}

shelf();
